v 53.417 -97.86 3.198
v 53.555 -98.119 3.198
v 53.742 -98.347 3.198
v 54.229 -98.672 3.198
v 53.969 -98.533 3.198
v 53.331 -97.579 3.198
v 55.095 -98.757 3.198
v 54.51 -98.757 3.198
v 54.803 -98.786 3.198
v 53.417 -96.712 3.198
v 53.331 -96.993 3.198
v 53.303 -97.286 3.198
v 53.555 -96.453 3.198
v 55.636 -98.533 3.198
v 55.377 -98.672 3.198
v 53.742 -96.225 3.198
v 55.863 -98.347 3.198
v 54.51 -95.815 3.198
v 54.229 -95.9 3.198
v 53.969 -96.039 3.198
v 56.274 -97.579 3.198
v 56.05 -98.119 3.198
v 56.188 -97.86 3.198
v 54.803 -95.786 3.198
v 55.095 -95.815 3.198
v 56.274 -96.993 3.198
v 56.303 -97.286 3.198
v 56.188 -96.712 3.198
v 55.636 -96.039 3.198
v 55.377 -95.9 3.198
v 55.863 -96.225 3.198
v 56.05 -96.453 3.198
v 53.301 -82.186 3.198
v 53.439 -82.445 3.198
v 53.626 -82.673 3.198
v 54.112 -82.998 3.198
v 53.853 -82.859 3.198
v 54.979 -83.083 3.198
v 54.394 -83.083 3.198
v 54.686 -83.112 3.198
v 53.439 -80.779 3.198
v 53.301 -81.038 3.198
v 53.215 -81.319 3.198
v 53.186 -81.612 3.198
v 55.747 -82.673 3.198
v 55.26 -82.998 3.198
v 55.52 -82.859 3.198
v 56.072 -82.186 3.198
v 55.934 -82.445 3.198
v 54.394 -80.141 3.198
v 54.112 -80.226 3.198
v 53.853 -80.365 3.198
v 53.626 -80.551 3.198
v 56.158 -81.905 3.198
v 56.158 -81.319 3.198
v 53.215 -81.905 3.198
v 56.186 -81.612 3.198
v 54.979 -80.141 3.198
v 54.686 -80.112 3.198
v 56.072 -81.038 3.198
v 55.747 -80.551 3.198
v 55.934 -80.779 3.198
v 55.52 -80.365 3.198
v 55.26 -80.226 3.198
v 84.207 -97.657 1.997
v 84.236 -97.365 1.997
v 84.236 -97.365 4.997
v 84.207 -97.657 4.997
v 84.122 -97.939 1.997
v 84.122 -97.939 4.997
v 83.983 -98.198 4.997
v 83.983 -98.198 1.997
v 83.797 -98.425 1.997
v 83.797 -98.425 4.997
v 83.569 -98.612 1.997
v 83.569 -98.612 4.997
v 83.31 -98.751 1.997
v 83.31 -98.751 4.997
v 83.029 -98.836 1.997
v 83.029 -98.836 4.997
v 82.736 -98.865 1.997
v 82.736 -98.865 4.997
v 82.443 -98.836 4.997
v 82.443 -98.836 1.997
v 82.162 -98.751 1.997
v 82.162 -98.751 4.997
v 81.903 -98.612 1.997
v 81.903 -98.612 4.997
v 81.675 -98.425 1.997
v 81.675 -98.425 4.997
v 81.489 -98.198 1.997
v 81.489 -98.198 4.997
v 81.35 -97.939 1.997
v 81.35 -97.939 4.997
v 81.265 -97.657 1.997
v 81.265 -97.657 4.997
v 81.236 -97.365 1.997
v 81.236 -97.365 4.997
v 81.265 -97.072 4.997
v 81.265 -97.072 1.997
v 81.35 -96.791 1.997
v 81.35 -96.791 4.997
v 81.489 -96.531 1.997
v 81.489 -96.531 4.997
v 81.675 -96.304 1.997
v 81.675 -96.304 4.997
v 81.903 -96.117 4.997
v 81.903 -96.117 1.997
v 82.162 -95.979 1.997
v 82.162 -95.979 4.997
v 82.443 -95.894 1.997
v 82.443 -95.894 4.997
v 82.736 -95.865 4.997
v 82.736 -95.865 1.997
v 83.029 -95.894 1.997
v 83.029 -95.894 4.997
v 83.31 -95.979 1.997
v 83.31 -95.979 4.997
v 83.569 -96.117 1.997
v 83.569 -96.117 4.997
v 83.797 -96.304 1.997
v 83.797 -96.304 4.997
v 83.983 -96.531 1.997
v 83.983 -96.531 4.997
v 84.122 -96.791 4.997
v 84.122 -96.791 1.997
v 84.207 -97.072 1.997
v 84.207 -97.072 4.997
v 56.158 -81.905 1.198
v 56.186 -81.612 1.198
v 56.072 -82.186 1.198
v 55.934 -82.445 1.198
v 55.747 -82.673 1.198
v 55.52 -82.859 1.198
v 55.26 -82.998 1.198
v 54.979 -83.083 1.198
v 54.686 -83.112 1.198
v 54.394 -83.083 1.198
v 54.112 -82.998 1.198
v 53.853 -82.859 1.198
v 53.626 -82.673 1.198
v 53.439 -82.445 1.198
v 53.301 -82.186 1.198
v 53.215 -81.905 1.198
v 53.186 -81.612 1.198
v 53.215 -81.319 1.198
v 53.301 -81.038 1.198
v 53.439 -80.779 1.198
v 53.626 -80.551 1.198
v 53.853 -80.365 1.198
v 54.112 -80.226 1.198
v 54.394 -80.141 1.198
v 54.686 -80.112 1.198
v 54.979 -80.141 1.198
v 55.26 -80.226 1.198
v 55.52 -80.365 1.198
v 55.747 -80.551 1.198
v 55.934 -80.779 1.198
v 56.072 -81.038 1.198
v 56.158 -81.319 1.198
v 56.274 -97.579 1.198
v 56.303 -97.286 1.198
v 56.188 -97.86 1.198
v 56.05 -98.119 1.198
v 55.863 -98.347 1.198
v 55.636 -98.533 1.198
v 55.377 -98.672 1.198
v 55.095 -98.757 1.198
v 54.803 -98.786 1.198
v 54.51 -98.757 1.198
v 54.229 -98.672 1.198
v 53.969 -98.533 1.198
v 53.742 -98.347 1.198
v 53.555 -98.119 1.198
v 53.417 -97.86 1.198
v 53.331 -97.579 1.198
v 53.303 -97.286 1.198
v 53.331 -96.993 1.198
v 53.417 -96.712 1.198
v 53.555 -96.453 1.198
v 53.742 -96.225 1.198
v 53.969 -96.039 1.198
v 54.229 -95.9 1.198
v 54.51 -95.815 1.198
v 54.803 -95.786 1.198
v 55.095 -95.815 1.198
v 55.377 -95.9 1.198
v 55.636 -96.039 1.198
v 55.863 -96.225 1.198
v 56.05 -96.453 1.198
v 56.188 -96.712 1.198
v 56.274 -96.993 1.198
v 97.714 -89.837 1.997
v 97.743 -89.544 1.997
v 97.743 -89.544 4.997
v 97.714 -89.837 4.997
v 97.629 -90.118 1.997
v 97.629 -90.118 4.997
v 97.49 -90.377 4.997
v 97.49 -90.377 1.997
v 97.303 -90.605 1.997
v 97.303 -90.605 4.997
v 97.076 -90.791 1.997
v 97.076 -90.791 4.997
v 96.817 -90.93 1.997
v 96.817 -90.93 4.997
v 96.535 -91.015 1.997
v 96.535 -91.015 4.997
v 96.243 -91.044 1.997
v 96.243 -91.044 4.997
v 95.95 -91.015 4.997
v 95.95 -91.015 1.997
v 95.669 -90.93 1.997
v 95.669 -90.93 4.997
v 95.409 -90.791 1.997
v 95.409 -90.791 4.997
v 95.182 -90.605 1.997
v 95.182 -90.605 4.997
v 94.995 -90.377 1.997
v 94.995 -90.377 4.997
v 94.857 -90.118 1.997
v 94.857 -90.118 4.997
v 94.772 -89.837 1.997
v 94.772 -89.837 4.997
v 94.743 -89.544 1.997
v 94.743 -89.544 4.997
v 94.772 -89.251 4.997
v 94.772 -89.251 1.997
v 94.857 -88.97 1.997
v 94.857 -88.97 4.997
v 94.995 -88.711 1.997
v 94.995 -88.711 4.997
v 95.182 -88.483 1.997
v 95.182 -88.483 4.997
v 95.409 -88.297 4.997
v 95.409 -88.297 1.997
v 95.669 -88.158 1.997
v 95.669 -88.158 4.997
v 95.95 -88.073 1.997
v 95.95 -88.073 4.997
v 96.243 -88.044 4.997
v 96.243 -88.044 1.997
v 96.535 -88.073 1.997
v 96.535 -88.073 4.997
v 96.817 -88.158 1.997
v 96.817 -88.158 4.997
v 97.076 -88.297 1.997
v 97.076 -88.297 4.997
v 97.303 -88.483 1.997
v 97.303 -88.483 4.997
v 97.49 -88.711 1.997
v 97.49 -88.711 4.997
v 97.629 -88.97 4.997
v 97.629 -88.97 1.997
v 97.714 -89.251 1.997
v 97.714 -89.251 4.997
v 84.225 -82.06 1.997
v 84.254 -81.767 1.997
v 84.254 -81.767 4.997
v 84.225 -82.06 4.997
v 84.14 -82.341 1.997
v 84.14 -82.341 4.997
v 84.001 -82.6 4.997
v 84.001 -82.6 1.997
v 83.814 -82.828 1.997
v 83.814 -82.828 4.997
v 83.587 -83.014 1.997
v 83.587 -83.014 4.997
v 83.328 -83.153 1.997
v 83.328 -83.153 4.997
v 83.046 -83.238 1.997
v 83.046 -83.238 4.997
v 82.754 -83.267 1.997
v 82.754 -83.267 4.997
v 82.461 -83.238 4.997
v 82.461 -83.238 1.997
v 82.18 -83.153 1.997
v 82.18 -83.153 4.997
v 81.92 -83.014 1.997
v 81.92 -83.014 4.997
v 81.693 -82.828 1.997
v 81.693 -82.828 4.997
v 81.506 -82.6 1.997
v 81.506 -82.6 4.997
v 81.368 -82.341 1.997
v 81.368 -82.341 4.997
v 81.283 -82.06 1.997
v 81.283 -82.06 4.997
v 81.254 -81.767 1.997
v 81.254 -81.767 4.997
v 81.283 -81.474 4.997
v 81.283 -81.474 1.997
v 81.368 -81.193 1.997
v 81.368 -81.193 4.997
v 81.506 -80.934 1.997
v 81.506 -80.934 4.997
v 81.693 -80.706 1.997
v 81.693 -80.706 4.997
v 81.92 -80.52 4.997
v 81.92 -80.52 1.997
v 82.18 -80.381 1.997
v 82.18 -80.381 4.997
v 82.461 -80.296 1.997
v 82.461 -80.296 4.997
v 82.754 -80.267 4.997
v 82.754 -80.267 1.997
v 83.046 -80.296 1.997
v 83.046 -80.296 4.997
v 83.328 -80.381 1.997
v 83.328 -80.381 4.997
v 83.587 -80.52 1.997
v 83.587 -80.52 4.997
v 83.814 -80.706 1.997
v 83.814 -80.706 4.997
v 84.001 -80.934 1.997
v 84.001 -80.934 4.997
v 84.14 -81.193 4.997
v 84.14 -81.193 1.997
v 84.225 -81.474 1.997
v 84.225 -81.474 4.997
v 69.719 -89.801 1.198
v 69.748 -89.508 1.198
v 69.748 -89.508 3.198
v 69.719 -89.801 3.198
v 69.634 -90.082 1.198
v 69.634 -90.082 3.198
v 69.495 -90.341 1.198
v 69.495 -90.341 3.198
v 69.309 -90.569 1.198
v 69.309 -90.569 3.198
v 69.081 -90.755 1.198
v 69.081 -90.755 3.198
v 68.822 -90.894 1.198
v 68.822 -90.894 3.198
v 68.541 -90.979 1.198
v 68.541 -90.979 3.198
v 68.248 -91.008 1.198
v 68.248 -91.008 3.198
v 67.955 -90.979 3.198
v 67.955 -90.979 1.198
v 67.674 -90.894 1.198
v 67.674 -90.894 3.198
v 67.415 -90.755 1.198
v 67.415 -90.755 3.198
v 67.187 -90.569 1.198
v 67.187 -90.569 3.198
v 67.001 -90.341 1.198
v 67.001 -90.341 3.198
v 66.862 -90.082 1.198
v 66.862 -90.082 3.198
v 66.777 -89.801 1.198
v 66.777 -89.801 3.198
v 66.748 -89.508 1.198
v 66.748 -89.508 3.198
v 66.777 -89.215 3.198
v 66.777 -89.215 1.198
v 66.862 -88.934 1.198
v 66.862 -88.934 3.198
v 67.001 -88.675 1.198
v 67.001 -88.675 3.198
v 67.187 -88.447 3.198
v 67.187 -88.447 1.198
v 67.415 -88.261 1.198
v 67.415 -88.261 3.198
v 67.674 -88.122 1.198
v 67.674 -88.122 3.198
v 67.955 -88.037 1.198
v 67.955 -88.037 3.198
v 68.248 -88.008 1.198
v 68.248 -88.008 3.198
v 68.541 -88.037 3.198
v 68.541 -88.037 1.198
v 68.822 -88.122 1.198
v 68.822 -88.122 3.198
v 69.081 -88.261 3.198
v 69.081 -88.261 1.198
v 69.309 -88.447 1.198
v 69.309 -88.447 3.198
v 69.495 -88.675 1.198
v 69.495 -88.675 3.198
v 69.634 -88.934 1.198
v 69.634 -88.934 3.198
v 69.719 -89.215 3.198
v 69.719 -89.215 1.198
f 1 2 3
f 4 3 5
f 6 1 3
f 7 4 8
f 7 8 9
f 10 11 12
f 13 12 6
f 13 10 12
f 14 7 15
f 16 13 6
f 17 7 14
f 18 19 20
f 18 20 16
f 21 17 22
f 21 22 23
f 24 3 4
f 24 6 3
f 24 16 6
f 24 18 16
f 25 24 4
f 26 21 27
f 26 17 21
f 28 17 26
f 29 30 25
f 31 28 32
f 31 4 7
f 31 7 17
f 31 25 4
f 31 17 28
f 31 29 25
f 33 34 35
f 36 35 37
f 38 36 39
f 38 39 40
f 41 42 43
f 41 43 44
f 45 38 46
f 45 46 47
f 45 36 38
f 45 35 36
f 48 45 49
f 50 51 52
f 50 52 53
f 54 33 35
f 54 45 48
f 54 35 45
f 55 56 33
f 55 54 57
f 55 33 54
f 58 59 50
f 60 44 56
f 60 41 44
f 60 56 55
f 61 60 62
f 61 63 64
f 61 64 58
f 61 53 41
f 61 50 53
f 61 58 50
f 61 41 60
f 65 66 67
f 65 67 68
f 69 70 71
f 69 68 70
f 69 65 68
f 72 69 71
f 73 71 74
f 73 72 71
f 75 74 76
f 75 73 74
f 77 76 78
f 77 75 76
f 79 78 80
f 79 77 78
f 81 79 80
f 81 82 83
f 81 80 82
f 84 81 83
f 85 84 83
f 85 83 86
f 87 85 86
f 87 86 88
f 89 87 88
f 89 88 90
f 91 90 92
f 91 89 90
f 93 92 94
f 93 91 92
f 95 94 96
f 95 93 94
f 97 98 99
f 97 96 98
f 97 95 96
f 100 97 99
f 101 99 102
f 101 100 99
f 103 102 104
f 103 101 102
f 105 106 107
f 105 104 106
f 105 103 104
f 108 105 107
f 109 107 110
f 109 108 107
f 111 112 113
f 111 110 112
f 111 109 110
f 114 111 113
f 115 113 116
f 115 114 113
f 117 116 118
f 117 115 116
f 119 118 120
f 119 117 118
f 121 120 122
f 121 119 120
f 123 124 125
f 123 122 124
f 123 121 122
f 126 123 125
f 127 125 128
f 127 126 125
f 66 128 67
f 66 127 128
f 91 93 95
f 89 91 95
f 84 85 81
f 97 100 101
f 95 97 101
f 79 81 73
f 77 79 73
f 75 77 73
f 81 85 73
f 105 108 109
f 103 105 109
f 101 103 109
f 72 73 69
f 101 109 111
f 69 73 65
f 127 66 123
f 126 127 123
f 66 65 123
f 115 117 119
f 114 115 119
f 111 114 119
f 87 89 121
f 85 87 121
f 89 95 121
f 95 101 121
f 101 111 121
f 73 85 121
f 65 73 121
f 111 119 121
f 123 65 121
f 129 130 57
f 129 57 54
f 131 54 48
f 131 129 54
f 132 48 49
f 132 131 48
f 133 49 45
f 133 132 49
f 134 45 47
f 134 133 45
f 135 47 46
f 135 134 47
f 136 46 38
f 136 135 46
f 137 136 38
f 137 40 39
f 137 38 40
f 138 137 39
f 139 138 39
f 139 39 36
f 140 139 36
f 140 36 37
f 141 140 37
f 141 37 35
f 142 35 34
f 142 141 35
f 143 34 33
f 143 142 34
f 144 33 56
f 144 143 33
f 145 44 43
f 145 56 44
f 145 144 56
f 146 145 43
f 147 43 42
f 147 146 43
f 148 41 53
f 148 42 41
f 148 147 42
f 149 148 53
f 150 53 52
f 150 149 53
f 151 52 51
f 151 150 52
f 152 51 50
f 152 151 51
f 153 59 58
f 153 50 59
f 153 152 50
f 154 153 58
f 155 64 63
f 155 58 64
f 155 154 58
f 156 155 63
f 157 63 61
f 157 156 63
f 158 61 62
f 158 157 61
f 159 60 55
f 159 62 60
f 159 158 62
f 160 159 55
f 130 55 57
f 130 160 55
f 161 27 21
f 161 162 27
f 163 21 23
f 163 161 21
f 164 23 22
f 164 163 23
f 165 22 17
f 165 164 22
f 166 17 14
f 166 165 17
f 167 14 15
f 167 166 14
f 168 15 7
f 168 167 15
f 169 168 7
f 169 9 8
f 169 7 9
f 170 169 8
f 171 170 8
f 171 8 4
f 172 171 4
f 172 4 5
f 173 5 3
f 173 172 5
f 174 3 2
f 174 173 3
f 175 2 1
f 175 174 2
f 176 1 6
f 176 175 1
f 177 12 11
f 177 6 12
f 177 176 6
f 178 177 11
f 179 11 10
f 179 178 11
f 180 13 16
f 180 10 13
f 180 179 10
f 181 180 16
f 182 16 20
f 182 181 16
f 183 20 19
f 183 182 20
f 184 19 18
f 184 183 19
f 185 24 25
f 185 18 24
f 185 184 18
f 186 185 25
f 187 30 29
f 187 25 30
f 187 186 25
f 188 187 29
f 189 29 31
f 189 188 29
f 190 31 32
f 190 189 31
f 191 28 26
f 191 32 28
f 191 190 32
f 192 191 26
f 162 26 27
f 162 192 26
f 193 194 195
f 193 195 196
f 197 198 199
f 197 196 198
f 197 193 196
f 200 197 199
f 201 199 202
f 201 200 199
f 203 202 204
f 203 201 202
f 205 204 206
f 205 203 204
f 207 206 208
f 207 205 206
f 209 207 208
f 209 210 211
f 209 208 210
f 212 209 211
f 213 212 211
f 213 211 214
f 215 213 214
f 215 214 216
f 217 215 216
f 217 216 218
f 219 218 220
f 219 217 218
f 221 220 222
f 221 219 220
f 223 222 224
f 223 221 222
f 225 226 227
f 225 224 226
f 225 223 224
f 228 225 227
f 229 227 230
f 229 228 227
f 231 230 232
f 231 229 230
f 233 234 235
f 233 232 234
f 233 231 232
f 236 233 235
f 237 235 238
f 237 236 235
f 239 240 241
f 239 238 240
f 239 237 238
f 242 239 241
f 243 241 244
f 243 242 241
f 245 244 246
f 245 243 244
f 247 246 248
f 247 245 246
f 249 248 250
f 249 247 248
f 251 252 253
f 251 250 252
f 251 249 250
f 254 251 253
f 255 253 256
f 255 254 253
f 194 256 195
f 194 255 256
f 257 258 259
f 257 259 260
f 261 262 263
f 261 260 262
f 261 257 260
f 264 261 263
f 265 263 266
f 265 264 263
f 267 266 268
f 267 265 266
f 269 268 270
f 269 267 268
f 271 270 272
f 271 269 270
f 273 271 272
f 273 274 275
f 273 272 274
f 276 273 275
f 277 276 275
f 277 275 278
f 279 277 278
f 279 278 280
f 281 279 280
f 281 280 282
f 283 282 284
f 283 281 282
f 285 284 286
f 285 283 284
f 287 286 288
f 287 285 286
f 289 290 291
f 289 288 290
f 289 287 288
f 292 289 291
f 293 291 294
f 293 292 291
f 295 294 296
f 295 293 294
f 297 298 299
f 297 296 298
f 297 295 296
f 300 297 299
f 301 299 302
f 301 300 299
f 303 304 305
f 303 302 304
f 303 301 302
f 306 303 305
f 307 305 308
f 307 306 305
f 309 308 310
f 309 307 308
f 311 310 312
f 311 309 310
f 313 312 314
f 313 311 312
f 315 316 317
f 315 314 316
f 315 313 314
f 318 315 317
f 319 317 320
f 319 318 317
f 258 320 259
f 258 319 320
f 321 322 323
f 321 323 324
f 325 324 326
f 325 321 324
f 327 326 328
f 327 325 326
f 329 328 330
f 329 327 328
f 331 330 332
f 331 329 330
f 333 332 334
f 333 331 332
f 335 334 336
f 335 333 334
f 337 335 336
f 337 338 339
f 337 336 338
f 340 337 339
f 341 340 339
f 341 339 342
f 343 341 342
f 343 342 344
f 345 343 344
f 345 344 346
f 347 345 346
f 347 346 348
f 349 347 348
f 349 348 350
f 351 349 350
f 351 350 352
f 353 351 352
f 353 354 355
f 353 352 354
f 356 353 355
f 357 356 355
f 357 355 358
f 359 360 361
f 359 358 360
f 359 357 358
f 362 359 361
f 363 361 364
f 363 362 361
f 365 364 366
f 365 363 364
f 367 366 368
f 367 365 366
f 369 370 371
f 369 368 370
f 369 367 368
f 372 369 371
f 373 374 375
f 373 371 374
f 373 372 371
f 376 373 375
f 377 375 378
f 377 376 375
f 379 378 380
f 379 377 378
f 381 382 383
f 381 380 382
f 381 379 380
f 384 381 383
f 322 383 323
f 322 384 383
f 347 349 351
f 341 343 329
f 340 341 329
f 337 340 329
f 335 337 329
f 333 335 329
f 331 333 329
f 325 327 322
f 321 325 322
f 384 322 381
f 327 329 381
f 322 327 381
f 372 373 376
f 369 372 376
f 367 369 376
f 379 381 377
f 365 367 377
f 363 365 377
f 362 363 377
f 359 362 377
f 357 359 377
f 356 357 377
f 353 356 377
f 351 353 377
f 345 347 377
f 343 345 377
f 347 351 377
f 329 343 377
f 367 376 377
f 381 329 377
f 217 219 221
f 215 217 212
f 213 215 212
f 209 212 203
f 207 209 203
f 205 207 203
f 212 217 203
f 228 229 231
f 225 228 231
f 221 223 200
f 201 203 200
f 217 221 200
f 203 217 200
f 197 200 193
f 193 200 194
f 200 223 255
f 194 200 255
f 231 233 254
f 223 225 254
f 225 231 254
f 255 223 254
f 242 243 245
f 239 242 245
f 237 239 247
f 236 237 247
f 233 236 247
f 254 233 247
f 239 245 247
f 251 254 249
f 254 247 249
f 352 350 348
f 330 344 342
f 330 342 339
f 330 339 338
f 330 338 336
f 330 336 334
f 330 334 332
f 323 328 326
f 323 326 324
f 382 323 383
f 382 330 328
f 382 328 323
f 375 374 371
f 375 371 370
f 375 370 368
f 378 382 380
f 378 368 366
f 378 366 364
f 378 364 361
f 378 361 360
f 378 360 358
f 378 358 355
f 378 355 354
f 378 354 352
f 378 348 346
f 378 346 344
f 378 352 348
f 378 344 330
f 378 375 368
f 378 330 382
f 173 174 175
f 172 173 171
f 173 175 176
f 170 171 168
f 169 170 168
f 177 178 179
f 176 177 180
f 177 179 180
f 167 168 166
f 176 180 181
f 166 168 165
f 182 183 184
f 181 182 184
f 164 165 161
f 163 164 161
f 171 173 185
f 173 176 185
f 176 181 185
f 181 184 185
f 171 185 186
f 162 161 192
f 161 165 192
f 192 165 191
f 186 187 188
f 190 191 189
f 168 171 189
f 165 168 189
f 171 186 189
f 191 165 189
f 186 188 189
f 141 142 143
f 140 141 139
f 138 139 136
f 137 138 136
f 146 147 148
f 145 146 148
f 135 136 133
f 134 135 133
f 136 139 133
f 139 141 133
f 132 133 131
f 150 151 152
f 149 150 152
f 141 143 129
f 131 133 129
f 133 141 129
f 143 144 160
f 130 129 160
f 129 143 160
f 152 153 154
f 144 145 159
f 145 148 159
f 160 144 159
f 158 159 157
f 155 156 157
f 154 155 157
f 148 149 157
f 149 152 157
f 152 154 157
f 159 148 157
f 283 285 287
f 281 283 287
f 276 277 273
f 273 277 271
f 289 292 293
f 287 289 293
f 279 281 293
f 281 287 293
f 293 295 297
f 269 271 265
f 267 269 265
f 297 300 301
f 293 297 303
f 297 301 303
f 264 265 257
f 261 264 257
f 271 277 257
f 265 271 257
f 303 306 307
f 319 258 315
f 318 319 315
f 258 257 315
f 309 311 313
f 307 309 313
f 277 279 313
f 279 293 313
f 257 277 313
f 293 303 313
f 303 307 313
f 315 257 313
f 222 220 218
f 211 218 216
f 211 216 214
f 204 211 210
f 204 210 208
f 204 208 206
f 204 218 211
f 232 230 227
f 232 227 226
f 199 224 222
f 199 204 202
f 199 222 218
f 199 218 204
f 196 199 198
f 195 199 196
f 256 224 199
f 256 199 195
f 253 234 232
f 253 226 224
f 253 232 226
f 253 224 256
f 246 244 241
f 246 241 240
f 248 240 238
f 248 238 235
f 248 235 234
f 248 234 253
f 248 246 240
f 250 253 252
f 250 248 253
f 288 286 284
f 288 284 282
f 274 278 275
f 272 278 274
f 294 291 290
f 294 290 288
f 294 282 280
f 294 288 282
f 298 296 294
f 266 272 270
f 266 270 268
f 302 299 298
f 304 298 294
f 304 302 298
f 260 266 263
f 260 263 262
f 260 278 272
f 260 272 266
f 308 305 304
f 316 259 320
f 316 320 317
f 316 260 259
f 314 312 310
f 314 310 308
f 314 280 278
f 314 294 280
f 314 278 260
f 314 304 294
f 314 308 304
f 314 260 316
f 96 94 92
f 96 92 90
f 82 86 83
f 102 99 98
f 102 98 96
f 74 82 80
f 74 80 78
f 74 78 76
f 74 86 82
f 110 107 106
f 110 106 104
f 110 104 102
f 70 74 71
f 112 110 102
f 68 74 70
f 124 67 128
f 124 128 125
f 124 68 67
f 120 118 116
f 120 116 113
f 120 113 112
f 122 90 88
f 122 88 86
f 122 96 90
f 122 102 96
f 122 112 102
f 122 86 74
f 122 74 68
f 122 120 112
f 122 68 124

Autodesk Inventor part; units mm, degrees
ref_plane "YZ Plane" through (0, 0, 0) normal (1, 0, 0) x (0, 1, 0)
ref_plane "XZ Plane" through (0, 0, 0) normal (0, 1, 0) x (-1, 0, 0)
ref_plane "XY Plane" through (0, 0, 0) normal (0, 0, 1) x (1, 0, 0)
sketch "Skizze1" plane through (79.33, -93.671, 1.997) normal (0, 0, 1) x (1, 0, 0)
  circle A0 centre (3.4237, 11.9039) radius 1.273 projected
  circle A1 centre (16.9127, 4.1271) radius 1.2955 projected
  circle A2 centre (3.4059, -3.6937) radius 1.3406 projected
  circle A3 centre (3.4237, 11.9039) radius 1.5
  circle A4 centre (16.9127, 4.1271) radius 1.5
  circle A5 centre (3.4059, -3.6937) radius 1.5
  point P0 (-79.33, 93.671)
  dimension "d0" = 3
  dimension "d1" = 3
  dimension "d2" = 3
extrude "Extrusion1" add sketch "Skizze1" along normal blind 3 contours A0 | A1 | A2 | A3 | A4 | A5
sketch "Skizze2" plane through (65.788, -88.308, 1.198) normal (0, 0, 1) x (1, 0, 0)
  circle A0 centre (-11.1016, 6.6961) radius 1.4233 projected
  circle A1 centre (-10.9854, -8.9781) radius 1.2319 projected
  circle A2 centre (2.4601, -1.2) radius 1.287 projected
  circle A3 centre (-11.1016, 6.6961) radius 1.5
  circle A4 centre (2.4601, -1.2) radius 1.5
  circle A5 centre (-10.9854, -8.9781) radius 1.5
  point P0 (-65.788, 88.308)
  dimension "d5" = 3
  dimension "d6" = 3
  dimension "d7" = 3
extrude "Extrusion2" add sketch "Skizze2" along normal blind 2 contours A0 | A1 | A2 | A3 | A4 | A5
properties part number "Pump_Base"
